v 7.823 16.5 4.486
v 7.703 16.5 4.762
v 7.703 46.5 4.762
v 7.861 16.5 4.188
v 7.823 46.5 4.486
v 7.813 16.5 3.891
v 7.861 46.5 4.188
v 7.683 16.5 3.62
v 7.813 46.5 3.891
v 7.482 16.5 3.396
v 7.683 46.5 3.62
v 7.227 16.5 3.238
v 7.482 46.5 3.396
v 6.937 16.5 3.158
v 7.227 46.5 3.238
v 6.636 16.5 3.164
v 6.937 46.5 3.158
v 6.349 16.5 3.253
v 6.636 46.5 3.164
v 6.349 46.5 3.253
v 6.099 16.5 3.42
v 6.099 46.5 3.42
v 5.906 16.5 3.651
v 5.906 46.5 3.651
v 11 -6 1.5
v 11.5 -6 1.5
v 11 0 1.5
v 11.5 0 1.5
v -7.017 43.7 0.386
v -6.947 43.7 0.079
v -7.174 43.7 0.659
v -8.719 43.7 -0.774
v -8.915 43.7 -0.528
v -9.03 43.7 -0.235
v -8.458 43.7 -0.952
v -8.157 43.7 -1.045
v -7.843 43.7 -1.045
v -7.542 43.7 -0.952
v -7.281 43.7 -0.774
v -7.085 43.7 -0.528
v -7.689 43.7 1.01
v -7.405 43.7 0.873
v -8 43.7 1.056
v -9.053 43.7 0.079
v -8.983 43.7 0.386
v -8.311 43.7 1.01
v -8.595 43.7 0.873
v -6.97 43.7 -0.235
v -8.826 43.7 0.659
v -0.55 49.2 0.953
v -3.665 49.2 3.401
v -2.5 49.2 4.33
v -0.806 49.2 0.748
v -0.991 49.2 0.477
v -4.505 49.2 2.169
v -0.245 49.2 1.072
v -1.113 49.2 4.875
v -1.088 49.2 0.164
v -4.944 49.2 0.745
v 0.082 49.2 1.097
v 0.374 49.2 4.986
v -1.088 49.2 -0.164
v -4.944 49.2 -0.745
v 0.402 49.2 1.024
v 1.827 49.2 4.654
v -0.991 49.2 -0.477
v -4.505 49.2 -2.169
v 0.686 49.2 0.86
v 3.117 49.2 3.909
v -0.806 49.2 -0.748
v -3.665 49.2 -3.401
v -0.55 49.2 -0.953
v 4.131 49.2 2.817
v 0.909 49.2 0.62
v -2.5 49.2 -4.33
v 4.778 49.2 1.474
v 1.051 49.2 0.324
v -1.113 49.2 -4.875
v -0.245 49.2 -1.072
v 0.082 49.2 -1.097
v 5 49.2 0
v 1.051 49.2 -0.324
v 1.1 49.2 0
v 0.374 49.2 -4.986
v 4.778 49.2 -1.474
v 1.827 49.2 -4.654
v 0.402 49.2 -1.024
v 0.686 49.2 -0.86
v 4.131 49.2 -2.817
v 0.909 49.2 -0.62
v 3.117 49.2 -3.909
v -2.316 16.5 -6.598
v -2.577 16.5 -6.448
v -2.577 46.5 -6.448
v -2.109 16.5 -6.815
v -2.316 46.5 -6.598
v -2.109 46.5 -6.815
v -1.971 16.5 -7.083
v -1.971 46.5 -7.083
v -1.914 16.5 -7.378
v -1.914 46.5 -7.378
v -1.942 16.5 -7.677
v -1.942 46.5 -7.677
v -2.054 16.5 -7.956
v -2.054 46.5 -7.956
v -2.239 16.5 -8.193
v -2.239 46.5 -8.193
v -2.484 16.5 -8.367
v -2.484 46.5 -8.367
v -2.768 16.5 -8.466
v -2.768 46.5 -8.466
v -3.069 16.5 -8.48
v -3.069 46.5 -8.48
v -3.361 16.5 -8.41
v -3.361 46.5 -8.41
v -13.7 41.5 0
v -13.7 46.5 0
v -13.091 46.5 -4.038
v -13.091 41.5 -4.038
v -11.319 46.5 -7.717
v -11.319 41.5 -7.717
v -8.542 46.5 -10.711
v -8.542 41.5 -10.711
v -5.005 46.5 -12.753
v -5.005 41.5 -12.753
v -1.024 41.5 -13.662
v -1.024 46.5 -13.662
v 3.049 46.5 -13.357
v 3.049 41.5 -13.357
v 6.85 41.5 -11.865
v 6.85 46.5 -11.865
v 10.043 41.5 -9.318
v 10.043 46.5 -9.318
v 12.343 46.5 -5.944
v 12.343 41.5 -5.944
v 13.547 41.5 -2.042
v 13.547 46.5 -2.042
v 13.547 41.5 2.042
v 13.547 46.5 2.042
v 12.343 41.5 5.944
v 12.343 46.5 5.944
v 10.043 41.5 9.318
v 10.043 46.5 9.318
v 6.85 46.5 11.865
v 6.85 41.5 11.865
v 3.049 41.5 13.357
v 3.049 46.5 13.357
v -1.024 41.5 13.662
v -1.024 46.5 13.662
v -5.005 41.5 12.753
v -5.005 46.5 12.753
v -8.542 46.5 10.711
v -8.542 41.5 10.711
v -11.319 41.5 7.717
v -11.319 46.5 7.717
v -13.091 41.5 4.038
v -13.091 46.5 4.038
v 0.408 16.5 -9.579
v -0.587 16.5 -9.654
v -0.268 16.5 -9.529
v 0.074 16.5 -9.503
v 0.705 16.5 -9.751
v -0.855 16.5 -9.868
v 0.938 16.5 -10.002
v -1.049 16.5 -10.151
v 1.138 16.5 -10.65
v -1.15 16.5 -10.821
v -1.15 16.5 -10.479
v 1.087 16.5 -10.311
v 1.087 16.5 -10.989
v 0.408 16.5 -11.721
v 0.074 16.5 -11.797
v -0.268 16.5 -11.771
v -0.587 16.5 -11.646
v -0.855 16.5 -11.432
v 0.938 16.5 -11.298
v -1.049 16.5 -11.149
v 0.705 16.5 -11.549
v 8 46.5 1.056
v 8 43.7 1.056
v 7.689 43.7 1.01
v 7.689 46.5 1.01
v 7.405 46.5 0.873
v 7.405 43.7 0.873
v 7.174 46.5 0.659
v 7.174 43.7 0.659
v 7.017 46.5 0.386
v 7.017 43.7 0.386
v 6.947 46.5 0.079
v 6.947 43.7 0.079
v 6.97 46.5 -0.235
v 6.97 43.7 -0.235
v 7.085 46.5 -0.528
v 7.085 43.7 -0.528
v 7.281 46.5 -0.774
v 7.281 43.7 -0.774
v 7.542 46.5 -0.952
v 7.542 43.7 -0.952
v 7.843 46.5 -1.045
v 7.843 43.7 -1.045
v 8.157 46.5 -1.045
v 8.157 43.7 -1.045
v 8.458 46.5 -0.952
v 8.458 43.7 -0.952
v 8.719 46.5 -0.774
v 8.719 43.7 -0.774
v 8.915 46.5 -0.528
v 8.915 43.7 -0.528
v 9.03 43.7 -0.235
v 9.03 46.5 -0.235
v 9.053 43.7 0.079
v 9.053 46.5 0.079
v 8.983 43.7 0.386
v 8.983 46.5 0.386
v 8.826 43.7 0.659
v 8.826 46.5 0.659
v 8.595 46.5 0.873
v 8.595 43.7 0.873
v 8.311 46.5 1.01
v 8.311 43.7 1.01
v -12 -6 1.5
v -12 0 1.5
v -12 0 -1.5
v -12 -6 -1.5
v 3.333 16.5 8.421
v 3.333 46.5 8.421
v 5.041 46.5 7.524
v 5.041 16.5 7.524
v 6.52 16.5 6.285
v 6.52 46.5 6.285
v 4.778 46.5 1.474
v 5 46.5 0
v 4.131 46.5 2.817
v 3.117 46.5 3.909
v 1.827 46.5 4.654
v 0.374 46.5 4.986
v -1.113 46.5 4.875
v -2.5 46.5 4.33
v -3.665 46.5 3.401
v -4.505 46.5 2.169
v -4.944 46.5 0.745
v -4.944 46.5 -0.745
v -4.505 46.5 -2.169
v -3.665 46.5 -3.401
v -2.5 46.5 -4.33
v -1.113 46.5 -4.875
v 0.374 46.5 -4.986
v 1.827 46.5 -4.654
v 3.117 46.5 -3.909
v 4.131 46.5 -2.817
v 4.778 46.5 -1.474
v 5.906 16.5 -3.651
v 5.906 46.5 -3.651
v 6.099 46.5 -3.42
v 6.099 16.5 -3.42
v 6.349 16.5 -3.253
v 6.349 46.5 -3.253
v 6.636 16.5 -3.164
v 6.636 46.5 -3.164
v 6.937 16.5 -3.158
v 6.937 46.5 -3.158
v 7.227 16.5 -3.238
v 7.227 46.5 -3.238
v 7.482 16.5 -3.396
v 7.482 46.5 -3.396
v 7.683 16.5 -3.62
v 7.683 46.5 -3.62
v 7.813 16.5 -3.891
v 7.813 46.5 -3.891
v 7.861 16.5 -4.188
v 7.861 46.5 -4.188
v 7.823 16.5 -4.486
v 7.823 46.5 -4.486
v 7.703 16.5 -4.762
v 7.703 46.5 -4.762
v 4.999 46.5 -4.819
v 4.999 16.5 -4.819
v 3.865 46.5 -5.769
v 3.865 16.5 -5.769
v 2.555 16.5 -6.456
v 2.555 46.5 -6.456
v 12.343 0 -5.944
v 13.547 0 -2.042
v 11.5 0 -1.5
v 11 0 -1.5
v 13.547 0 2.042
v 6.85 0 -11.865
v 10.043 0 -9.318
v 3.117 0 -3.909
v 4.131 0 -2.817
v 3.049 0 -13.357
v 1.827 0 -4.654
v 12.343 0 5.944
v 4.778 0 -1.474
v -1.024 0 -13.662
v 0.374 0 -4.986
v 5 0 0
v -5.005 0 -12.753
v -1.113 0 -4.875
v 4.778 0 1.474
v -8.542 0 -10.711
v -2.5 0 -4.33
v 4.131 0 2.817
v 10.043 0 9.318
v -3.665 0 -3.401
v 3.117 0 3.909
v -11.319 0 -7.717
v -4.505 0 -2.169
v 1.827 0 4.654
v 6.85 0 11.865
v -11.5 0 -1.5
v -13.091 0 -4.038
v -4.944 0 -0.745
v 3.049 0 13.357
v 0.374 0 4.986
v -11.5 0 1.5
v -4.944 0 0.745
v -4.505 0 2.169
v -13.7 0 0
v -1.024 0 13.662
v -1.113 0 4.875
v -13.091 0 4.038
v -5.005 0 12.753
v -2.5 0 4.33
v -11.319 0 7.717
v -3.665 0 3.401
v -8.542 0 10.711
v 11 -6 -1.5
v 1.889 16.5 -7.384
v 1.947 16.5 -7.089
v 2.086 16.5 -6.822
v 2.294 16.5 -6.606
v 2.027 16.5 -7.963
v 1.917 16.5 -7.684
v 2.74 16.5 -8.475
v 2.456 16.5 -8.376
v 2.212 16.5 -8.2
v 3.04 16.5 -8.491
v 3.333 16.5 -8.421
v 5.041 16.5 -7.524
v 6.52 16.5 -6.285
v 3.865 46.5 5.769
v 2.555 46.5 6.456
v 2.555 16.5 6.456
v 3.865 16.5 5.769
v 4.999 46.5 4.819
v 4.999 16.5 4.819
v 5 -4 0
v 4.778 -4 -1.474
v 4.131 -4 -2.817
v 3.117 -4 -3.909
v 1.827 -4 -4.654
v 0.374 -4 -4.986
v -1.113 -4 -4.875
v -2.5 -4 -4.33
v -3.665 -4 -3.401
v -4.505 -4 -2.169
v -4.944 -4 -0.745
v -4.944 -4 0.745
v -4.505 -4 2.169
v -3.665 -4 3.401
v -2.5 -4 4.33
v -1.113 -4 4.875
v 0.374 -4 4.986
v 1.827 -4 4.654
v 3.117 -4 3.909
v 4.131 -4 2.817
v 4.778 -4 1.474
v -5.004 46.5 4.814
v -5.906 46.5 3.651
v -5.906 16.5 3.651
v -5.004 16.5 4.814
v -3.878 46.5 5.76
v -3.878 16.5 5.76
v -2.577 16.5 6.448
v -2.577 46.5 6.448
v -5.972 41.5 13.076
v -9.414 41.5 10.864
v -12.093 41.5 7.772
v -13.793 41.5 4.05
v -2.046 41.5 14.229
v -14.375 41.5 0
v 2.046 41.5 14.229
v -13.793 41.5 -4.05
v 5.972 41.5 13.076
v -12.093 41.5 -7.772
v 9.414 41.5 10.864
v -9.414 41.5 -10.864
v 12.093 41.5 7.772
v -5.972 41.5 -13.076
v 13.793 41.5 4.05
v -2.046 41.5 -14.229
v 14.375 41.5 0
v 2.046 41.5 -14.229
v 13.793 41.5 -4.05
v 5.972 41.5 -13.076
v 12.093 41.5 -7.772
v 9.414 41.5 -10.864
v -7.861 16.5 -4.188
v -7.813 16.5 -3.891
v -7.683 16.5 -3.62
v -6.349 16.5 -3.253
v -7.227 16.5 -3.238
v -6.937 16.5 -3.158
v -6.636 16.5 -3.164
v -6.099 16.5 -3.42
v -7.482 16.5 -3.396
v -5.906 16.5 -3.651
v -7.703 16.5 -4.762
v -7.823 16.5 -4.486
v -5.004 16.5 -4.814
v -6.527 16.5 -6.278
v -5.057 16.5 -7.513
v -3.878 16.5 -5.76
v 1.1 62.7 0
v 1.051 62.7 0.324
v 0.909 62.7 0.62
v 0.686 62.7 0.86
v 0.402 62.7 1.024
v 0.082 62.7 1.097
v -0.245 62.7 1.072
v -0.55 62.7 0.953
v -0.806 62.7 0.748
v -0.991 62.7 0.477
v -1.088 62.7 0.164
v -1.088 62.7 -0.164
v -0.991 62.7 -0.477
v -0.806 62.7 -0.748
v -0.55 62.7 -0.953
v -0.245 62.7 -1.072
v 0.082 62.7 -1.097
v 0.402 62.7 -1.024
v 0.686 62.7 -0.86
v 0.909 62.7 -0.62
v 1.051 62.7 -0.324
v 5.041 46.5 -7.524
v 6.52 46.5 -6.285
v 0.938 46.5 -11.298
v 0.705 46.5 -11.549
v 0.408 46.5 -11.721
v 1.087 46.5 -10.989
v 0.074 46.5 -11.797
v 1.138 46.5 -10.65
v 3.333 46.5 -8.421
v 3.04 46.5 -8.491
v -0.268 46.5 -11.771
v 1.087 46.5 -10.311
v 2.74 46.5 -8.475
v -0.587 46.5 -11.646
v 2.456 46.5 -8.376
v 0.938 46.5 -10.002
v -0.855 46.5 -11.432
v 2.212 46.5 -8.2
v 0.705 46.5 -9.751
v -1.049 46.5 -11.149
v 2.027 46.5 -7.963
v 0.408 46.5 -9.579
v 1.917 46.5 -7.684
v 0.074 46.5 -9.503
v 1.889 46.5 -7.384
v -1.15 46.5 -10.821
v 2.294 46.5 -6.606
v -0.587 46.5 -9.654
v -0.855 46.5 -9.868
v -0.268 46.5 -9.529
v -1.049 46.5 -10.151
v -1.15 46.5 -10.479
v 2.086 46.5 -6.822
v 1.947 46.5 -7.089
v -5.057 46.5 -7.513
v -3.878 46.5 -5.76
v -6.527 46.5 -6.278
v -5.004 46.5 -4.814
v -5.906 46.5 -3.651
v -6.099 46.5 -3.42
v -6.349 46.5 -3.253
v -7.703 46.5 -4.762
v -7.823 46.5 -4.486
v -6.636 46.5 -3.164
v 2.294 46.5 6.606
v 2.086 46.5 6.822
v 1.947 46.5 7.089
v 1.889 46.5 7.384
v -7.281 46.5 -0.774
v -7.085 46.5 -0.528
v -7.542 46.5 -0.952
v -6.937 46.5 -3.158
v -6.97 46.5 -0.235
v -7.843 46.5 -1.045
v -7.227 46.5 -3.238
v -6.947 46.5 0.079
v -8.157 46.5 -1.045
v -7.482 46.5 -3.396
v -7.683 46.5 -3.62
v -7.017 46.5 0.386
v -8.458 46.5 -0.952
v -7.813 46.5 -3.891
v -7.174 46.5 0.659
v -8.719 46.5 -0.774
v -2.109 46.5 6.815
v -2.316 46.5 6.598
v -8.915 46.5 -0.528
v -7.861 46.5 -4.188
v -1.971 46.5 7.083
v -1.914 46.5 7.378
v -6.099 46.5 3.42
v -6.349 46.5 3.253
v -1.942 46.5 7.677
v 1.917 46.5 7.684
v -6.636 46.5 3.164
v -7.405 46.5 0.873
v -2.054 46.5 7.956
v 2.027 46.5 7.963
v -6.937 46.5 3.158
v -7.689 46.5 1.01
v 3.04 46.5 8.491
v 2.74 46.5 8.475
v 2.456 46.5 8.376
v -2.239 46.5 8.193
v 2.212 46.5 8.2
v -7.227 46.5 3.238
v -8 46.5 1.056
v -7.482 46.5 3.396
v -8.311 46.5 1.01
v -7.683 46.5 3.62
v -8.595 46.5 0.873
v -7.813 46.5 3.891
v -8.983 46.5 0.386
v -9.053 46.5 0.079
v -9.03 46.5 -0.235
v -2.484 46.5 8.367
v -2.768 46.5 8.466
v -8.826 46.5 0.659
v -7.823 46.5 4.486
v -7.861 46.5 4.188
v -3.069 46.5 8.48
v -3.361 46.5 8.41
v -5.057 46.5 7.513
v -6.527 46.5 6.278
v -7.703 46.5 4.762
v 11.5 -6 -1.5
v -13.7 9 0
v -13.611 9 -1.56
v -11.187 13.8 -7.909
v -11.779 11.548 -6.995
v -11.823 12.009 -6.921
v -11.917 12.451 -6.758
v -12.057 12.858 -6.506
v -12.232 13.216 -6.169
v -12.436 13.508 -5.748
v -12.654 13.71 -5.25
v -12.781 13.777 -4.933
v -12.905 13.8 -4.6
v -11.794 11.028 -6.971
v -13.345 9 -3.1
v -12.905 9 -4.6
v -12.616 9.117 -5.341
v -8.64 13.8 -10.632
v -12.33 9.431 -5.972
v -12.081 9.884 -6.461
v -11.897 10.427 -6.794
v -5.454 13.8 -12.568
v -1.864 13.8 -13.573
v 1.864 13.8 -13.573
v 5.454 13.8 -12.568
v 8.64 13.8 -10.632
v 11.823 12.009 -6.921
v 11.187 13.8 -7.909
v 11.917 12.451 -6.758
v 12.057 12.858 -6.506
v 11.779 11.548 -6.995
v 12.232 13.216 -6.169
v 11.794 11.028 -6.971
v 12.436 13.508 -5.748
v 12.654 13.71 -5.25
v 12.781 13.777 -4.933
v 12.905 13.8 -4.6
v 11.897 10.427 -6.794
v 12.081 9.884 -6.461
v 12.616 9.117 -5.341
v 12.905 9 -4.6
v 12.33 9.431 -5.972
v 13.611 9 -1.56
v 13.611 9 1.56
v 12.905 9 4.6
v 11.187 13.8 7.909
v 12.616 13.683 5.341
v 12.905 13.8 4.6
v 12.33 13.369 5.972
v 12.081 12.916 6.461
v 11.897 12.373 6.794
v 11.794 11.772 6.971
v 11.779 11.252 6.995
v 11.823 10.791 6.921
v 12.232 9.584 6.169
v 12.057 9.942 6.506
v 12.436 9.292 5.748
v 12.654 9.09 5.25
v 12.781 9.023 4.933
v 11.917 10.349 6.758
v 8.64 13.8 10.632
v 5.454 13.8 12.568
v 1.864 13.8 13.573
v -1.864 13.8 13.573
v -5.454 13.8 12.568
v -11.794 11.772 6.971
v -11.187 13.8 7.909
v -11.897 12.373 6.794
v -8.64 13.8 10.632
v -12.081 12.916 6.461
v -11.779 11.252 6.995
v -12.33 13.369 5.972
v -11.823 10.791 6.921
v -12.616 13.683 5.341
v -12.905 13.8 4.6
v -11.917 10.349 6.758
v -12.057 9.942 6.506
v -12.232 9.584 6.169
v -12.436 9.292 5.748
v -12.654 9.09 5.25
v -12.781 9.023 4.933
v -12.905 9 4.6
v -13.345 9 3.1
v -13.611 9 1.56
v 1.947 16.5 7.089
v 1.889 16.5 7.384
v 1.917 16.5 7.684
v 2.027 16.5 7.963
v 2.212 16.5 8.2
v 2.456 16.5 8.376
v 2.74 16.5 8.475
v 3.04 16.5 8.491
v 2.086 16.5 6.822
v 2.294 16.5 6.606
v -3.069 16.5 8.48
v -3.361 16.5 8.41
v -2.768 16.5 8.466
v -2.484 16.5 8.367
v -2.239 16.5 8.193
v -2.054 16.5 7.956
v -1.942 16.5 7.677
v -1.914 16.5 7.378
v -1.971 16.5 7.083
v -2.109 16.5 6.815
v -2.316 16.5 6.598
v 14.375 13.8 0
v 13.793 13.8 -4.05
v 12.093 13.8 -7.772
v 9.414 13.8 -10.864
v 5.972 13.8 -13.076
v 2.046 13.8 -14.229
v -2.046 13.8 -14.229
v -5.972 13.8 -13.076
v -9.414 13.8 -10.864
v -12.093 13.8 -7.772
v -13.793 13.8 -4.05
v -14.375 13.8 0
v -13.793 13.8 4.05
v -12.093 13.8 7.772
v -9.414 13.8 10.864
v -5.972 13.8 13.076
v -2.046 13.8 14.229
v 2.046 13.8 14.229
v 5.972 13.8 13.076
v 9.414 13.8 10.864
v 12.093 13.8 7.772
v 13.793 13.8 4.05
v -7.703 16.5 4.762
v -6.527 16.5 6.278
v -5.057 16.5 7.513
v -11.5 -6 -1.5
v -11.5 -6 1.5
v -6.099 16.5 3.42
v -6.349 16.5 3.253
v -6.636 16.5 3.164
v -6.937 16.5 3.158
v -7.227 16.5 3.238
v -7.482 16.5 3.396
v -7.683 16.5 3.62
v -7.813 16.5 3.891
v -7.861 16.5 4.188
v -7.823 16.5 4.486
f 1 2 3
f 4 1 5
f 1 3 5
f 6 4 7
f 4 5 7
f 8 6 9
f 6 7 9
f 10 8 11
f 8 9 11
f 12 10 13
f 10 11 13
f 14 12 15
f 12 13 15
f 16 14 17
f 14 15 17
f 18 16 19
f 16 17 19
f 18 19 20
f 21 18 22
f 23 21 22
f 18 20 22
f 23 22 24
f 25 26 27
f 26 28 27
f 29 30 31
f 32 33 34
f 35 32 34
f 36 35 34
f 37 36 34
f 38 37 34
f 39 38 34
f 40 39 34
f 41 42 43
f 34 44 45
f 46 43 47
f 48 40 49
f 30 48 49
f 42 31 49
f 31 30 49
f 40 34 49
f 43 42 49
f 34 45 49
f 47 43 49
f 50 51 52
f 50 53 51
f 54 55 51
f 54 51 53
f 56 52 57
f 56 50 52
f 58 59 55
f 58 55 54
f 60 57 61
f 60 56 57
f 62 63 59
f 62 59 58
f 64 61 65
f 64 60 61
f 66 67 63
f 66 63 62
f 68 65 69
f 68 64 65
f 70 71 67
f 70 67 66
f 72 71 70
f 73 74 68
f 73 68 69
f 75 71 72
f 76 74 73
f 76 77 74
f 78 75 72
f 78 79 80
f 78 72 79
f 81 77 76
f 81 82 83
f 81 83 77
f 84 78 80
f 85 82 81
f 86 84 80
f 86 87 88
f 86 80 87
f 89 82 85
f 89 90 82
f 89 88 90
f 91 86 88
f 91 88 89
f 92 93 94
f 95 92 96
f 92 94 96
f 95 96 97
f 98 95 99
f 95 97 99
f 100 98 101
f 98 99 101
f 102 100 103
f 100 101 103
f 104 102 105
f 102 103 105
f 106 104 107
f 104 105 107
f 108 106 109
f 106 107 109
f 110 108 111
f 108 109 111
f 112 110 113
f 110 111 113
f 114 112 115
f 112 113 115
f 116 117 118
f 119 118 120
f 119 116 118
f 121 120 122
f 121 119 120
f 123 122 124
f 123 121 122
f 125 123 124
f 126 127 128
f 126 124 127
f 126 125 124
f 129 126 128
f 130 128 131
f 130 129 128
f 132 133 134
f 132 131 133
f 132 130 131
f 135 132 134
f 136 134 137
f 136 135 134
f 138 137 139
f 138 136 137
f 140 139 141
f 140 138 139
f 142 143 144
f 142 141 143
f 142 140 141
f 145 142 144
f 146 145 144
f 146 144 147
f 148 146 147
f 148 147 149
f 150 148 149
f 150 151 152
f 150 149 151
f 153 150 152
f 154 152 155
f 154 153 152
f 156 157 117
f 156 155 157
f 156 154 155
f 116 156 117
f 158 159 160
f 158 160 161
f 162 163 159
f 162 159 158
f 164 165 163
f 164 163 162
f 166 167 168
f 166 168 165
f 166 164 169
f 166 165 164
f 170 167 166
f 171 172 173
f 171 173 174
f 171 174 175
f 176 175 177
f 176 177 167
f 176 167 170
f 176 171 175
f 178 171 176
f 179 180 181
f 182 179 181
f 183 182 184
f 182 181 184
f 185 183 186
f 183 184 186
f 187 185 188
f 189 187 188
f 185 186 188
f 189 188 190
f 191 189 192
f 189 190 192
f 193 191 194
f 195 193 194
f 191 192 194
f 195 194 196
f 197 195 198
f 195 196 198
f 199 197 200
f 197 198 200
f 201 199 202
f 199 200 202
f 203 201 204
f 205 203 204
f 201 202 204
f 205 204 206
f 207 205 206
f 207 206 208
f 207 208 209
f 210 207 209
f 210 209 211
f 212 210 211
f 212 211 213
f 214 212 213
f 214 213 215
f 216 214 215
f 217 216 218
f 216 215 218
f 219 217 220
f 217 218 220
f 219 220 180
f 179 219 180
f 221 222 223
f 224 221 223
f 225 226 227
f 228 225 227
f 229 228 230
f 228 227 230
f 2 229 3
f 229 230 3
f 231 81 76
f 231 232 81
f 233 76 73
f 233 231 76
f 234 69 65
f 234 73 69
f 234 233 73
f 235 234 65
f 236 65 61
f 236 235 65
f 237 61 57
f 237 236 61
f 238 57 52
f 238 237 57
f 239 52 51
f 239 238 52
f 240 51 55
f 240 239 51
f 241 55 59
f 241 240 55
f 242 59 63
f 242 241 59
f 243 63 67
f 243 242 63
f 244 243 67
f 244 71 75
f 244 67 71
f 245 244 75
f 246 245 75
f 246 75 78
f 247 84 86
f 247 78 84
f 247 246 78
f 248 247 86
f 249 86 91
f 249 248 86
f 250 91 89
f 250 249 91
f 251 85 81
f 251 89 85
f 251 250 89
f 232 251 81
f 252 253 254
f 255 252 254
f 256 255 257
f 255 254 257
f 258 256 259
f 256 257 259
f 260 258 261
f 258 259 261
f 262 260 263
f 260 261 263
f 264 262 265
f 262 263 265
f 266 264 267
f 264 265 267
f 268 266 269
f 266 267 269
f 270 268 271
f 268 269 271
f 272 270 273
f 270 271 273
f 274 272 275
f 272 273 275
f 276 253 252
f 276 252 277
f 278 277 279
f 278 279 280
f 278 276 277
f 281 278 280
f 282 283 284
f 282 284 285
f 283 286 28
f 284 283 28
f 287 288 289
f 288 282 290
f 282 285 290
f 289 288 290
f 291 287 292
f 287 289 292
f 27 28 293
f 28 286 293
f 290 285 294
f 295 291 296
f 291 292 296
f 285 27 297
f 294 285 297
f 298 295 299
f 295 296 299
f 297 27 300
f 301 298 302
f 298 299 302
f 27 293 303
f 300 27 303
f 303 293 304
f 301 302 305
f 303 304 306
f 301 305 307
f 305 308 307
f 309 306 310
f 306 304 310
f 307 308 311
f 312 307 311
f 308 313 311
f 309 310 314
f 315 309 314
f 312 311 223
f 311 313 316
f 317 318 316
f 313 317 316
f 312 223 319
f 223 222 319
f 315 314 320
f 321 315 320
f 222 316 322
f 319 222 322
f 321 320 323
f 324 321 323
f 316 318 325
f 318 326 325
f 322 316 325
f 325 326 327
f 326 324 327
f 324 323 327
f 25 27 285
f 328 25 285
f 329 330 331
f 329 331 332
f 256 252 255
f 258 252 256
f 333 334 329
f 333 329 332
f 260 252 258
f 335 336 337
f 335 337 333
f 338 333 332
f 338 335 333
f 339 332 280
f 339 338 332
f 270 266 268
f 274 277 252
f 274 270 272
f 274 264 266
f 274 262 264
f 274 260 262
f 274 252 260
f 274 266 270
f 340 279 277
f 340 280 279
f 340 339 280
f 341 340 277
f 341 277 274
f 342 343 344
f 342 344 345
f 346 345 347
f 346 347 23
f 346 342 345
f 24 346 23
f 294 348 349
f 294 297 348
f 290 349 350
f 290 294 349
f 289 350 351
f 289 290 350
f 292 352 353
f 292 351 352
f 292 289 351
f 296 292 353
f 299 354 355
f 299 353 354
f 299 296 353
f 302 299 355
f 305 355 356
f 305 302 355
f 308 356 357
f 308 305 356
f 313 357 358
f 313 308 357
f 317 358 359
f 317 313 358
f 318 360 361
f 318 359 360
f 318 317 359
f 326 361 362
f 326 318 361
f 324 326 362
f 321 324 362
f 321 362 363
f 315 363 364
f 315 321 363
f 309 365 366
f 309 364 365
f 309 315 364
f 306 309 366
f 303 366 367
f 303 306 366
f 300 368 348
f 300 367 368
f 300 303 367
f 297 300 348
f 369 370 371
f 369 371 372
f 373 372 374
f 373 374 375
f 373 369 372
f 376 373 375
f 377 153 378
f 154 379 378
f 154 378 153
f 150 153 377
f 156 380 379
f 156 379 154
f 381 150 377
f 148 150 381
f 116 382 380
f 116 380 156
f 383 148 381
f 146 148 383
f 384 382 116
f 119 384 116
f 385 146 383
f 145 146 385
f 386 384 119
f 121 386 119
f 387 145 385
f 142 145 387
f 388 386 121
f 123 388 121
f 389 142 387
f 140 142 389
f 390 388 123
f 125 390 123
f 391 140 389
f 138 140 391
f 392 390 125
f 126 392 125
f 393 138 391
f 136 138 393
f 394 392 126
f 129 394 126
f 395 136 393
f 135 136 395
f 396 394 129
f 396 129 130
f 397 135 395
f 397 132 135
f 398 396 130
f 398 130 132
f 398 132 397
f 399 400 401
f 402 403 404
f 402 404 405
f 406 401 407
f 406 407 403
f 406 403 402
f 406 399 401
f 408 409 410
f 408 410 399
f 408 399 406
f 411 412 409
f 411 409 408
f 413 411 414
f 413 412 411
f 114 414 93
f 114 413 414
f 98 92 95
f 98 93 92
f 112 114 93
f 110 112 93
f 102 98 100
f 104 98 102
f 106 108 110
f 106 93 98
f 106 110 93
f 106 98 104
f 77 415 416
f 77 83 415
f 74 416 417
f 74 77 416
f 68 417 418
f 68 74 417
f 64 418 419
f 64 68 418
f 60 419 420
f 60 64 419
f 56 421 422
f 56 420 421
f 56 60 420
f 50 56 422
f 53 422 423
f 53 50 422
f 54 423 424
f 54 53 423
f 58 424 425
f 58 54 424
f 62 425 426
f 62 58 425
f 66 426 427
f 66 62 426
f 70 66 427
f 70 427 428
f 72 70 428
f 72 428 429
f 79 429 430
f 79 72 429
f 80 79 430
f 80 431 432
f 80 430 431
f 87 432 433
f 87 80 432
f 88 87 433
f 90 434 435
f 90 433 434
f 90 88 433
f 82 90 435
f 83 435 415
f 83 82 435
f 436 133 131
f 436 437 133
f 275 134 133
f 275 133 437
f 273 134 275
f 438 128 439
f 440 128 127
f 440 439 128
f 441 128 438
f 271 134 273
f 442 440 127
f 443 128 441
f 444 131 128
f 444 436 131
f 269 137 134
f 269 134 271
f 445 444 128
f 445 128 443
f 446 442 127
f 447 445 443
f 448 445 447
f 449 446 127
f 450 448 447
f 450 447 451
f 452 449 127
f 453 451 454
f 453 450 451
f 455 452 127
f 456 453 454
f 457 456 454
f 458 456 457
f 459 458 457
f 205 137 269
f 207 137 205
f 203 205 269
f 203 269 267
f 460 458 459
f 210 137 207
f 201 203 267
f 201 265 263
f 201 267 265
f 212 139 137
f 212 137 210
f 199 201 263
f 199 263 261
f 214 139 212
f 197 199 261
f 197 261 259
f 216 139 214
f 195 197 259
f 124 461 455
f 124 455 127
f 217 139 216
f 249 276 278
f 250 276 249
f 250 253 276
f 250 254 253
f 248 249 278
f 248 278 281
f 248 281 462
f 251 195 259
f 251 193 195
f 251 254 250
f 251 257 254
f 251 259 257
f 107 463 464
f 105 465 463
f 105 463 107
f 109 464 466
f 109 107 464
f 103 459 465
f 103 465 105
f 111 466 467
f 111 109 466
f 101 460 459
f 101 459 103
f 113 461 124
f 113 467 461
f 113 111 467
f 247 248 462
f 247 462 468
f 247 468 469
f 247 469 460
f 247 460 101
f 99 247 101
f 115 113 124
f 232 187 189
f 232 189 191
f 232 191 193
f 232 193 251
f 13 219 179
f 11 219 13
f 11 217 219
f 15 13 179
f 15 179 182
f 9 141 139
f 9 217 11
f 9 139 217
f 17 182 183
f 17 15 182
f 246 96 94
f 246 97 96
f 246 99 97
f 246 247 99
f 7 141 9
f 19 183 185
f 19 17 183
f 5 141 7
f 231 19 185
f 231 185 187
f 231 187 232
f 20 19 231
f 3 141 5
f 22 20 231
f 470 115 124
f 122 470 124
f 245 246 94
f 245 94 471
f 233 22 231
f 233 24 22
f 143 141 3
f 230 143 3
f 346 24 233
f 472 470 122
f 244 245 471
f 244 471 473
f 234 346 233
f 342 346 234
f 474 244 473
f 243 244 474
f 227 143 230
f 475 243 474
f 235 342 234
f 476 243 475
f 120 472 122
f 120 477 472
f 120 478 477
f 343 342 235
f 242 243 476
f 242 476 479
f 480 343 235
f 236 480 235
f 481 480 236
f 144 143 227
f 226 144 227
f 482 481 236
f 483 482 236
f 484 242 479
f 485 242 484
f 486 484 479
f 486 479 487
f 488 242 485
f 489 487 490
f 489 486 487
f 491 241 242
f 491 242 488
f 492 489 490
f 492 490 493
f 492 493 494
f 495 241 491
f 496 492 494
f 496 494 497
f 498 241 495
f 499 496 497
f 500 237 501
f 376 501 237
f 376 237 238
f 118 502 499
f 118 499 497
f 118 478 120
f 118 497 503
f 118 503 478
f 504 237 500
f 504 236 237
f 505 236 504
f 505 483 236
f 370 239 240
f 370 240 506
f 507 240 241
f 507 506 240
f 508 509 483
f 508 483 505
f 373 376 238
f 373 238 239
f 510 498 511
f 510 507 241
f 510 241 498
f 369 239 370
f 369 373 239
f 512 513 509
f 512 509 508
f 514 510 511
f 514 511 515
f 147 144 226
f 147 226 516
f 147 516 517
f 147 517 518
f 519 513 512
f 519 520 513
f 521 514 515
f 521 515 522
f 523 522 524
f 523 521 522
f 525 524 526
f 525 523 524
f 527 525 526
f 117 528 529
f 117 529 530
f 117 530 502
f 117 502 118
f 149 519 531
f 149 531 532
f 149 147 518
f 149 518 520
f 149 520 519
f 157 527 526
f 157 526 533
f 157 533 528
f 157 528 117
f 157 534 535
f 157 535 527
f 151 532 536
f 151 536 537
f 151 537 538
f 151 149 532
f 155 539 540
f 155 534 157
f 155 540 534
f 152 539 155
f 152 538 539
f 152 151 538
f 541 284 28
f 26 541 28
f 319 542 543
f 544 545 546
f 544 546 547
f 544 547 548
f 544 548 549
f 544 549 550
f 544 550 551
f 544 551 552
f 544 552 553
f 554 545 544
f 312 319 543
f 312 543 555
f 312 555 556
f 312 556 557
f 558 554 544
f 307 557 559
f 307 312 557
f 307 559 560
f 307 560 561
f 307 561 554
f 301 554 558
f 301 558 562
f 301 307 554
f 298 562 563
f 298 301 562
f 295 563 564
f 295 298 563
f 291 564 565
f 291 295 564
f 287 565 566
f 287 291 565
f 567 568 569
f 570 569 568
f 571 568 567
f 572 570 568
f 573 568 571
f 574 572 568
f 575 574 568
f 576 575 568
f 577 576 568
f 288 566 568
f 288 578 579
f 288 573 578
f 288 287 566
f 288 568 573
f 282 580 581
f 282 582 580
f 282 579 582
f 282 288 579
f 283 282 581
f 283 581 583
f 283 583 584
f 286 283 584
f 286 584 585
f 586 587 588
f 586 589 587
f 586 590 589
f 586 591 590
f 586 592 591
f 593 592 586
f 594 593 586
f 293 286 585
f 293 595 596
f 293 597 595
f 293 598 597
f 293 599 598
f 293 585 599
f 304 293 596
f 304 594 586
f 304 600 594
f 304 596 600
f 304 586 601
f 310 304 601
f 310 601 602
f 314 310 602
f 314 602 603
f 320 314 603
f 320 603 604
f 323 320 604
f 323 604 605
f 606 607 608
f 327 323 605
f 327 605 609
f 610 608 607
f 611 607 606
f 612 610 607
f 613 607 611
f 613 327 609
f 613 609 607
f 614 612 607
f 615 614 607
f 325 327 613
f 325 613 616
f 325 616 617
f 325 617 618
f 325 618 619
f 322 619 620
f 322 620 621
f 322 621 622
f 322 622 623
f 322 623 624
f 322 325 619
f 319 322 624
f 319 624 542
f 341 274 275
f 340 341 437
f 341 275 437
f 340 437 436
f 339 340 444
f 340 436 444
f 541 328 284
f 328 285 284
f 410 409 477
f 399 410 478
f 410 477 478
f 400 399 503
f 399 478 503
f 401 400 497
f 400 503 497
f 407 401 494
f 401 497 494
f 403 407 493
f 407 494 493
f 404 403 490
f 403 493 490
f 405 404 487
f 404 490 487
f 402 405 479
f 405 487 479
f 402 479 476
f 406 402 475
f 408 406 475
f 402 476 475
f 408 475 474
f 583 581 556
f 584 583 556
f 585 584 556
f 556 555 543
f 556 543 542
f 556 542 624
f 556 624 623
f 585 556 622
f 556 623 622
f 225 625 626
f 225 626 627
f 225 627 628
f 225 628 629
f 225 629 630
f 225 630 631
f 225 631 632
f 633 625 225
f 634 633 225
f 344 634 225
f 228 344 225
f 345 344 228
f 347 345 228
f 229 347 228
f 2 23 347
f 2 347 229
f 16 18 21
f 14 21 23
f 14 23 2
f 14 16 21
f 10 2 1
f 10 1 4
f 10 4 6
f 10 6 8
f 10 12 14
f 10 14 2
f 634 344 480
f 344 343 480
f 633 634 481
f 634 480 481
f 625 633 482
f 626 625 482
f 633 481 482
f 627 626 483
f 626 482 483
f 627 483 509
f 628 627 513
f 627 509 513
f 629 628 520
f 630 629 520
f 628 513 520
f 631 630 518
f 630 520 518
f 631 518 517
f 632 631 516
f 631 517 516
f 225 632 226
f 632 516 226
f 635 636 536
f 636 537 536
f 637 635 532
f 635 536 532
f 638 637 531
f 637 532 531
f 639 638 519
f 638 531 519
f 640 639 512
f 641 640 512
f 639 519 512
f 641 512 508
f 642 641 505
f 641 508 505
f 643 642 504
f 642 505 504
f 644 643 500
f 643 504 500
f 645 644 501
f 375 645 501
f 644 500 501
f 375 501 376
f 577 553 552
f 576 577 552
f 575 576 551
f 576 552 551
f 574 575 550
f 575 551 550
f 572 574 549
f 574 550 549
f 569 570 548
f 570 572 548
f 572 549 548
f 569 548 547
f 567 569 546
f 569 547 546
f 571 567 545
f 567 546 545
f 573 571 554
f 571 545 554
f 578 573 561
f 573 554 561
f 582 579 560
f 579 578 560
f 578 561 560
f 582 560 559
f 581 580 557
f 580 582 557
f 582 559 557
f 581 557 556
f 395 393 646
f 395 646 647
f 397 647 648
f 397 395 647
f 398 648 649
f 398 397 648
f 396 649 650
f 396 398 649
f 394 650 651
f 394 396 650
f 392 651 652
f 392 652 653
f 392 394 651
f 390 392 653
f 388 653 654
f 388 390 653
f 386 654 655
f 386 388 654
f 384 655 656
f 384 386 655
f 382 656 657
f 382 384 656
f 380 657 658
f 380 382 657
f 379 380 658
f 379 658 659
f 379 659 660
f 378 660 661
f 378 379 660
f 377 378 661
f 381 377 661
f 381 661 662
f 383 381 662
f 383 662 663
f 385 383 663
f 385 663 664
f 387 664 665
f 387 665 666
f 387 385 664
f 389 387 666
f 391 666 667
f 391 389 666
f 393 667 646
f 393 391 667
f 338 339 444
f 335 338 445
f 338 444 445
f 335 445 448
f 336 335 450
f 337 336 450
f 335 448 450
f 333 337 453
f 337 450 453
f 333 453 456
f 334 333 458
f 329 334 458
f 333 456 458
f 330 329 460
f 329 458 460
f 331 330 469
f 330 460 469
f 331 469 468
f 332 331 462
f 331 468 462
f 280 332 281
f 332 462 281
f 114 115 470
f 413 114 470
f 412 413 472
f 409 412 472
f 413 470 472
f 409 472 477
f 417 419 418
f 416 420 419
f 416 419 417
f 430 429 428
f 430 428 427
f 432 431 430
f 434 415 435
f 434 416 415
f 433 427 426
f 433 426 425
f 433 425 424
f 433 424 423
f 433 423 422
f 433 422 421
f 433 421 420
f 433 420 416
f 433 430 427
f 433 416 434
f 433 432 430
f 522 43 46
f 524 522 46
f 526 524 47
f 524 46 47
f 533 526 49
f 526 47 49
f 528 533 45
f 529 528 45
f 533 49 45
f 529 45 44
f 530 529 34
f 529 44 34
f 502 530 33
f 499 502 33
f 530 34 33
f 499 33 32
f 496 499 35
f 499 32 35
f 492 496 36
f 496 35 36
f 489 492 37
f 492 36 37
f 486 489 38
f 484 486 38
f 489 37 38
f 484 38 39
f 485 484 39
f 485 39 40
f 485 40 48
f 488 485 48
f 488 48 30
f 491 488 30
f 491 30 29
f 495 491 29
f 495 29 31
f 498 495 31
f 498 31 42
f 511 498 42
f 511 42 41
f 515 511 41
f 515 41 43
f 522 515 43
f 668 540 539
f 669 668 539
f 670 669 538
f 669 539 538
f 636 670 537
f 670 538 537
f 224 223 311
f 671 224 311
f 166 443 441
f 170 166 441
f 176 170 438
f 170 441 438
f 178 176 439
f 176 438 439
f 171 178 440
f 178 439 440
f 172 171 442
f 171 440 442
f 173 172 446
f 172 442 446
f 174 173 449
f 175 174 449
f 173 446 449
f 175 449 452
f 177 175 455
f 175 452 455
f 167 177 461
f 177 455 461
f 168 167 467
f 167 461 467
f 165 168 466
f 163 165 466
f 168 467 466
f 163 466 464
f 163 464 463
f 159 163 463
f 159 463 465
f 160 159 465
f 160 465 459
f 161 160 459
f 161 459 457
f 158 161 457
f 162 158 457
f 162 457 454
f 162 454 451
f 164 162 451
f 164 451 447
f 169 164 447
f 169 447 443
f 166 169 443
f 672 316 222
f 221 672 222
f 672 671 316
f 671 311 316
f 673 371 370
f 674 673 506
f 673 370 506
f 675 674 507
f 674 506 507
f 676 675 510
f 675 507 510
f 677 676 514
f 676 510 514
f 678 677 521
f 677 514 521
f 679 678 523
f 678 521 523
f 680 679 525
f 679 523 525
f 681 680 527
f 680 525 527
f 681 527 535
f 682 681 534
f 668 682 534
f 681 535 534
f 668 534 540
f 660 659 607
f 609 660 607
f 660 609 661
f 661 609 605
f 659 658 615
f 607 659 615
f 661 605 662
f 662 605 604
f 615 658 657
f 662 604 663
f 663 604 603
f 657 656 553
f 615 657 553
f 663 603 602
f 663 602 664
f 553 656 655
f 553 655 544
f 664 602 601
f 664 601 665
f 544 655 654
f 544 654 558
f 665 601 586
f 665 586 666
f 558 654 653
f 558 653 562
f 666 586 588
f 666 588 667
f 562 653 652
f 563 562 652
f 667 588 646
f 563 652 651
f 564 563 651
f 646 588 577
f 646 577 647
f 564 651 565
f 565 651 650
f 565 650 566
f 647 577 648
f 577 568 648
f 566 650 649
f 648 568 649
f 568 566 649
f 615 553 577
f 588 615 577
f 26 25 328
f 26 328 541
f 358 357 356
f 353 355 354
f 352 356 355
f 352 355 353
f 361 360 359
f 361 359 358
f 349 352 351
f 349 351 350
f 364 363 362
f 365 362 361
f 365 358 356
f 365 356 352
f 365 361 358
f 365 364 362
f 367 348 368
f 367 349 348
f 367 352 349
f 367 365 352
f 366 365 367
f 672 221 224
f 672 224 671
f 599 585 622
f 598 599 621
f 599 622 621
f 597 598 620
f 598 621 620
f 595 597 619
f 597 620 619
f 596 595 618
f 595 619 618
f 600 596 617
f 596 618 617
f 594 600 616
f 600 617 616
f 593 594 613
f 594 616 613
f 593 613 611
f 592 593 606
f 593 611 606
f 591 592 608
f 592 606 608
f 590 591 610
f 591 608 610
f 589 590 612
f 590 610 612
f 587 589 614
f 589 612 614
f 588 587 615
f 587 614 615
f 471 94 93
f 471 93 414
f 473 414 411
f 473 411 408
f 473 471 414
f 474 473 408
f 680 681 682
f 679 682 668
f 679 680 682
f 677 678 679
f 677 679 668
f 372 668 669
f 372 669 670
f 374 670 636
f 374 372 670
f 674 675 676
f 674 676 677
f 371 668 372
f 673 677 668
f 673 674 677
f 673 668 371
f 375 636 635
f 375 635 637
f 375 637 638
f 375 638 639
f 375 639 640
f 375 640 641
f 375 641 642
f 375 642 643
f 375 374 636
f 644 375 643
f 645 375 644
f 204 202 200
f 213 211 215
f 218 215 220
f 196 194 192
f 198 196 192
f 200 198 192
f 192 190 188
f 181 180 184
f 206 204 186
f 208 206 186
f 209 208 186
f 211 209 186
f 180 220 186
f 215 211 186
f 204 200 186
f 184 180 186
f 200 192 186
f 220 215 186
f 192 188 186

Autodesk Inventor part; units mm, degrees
ref_plane "YZ Plane" through (0, 0, 0) normal (1, 0, 0) x (0, 1, 0)
sketch "Sketch1" plane through (0, 0, 0) normal (0, 1, 0) x (-1, 0, 0)
  circle A0 centre (0, 0) radius 13.7
  dimension "d0" = 27.4
extrude "Extrusion1" add sketch "Sketch1" along normal blind 46.5
sketch "Sketch2" plane through (0, 46.5, 0) normal (0, 1, 0) x (1, 0, 0)
  circle A0 centre (0, 0) radius 13.7 projected
  circle A1 centre (0, 0) radius 5
  dimension "d3" = 10
extrude "Extrusion2" add sketch "Sketch2" along normal blind 2.7 contours A1
sketch "Sketch3" plane through (0, 46.5, 0) normal (0, 1, 0) x (1, 0, 0)
  circle A0 centre (0, 0) radius 5 projected
  circle A1 centre (0, 0) radius 5 projected
  circle A2 centre (0, 0) radius 13.7 projected
  circle A3 centre (0, 0) radius 13.7 projected
  line L0 (-13.7, 0) -> (13.7, 0)
  point P0 (-8, 0)
  point P1 (8, 0)
  dimension "d6" = 16
  dimension "d7" = 5.7
  dimension "d8" = 5.7
hole "Hole1" at (-8, 46.5, 0) at (8, 46.5, 0) direction (0, -1, 0) diameter 2.1129 depth 2.8 thread size "M2.6x0.45" class "6H" standard "ISO Metric profile"
ref_plane "Work Plane1" through (0, 41.5, 0) normal (0, 1, 0) x (1, 0, 0)
sketch "Sketch4" plane through (0, 41.5, 0) normal (0, 1, 0) x (1, 0, 0)
  circle A0 centre (0, 0) radius 14.375
  dimension "d17" = 28.75
extrude "Extrusion3" add sketch "Sketch4" against normal blind 27.7
sketch "Sketch5" plane through (0, 0, 0) normal (0, -1, 0) x (1, 0, 0)
  circle A0 centre (0, 0) radius 5
  dimension "d20" = 10
extrude "Extrusion4" add sketch "Sketch5" along normal blind 4
sketch "Sketch6" plane through (0, 0, 0) normal (0, -1, 0) x (1, 0, 0)
  circle A0 centre (0, 0) radius 5 projected
  circle A1 centre (0, 0) radius 5 projected
  circle A2 centre (0, 0) radius 13.7 projected
  circle A3 centre (0, 0) radius 13.7 projected
  line L0 (13.7, 0) -> (-13.7, 0)
  line L1 (-11.5, 1.5) -> (-12, 1.5)
  line L2 (-12, 1.5) -> (-12, -1.5)
  line L3 (-12, -1.5) -> (-11.5, -1.5)
  line L4 (-11.5, -1.5) -> (-11.5, 1.5)
  line L5 (11.5, 1.5) -> (11, 1.5)
  line L6 (11, 1.5) -> (11, -1.5)
  line L7 (11, -1.5) -> (11.5, -1.5)
  line L8 (11.5, -1.5) -> (11.5, 1.5)
  dimension "d23" = 22.5
  dimension "d24" = 0.5
  dimension "d25" = 0.5
  dimension "d26" = 11.5
  dimension "d27" = 11.5
  dimension "d28" = 3
  dimension "d29" = 3
  dimension "d30" = 1.5
  dimension "d31" = 1.5
extrude "Extrusion5" add sketch "Sketch6" along normal blind 6 contours L6 L5 L8 L0 | L0 L8 L7 L6 | L4 L3 L2 L0 | L0 L2 L1 L4
sketch "Sketch7" plane through (0, 49.2, 0) normal (0, 1, 0) x (1, 0, 0)
  circle A0 centre (0, 0) radius 1.1
  dimension "d34" = 2.2
extrude "Extrusion6" add sketch "Sketch7" along normal blind 13.5
ref_plane "Work Plane2" through (0, 50.2, 0) normal (0, 1, 0) x (1, 0, 0)
sketch "Sketch10" plane through (0, 0, 0) normal (1, 0, 0) x (0, 1, 0)
  line L0 (0, -13.7) -> (0, 13.7) projected
  line L1 (13.8, 13.7) -> (13.8, -13.7) projected
  line L2 (9, 4.6) -> (13.8, 4.6)
  line L3 (13.8, 4.6) -> (13.8, -4.6)
  line L4 (13.8, -4.6) -> (9, -4.6)
  line L5 (9, -4.6) -> (9, 4.6)
  circle A0 centre (11.4, 4.6) radius 2.4
  circle A1 centre (11.4, -4.6) radius 2.4
  line L6 (0, 0) -> (13.8, 0)
  line L7 (13.8, 13.7) -> (13.8, -13.7) projected
  line L8 (0, -13.7) -> (13.8, -13.7) projected
  point P0 (11.4, 7)
  point P1 (11.4, -7)
  point P2 (13.8, -4.6)
  dimension "d57" = 9
  dimension "d59" = 0
  dimension "d60" = 4.8
  dimension "d61" = 13.8
  dimension "d62" = 2.4
  dimension "d63" = 2.4
  dimension "d64" = 14
  dimension "d65" = 4.6
  dimension "d66" = 4.6
  dimension "d69" = 6.7
extrude "Extrusion9" cut sketch "Sketch10" along normal mid plane 31.5 contours L6 L1 A1 L5 | L5 A0 L1 L6 | A1 L4 | L4 A1 | A0 L2 | L2 A0
sketch "Sketch11" plane through (0, 46.5, 0) normal (0, 1, 0) x (1, 0, 0)
  circle A0 centre (-8, 0) radius 1.0564 projected
  circle A1 centre (8, 0) radius 1.0564 projected
  circle A2 centre (0, 0) radius 5 projected
  circle A3 centre (0, 0) radius 13.7 projected
  circle A4 centre (8, 0) radius 1.0564 projected
  circle A5 centre (0, 0) radius 13.7 projected
  line L0 (13.7, 0) -> (-13.7, 0)
  circle A6 centre (0, 0) radius 1.1 projected
  circle A7 centre (0, 0) radius 9.0564
  circle A8 centre (0, 0) radius 6.9436
  circle A9 centre (8, 0) radius 1.0564 projected
  line L1 (1.8876, -9.0564) -> (-1.9124, -9.0564)
  line L2 (-1.9124, -9.0564) -> (-1.9124, 9.0564)
  line L3 (-1.9124, 9.0564) -> (1.8876, 9.0564)
  line L4 (1.8876, 9.0564) -> (1.8876, -9.0564)
  line L5 (-0.0124, -13.7) -> (-0.0124, 13.7)
  line L6 (9.0564, -3.15) -> (-9.0564, -3.15)
  line L7 (-9.0564, -3.15) -> (-9.0564, 3.15)
  line L8 (-9.0564, 3.15) -> (9.0564, 3.15)
  line L9 (9.0564, 3.15) -> (9.0564, -3.15)
  circle A10 centre (6.8048, -4.2064) radius 1.0564
  circle A11 centre (2.9441, -7.4386) radius 1.0564
  circle A12 centre (-2.9688, -7.4287) radius 1.0564
  circle A13 centre (-6.8048, -4.2064) radius 1.0564
  circle A14 centre (-6.8048, 4.2064) radius 1.0564
  line L10 (-11.7767, 7) -> (11.7767, 7) projected
  circle A15 centre (-2.9688, 7.4287) radius 1.0564
  circle A16 centre (2.9441, 7.4386) radius 1.0564
  circle A17 centre (6.8048, 4.2064) radius 1.0564
  circle A18 centre (-0.0124, 10.65) radius 1.15
  point P0 (9.0564, 0)
  point P1 (7.8048, -3.2064)
  point P2 (3.3328, 8.4209)
  point P3 (2.5553, 6.4563)
  point P4 (5.9062, 3.651)
  point P5 (7.7035, 4.7619)
  point P6 (-5.9062, 3.651)
  point P7 (-2.5768, 6.4477)
  point P8 (-3.3608, 8.4097)
  point P9 (-7.7035, 4.7619)
  point P10 (-3.3608, -8.4097)
  point P11 (-2.5768, -6.4477)
  point P12 (-5.9062, -3.651)
  point P13 (-7.7035, -4.7619)
  point P14 (7.7035, -4.7619)
  point P15 (5.9062, -3.651)
  point P16 (2.5553, -6.4563)
  point P17 (3.3328, -8.4209)
  point P18 (-0.0124, 11.8)
  dimension "d78" = 2.3
  dimension "d70" = 3.8
  dimension "d71" = 1.9
  dimension "d72" = 1.9
  dimension "d73" = 6.3
  dimension "d74" = 3.15
  dimension "d75" = 3.15
  dimension "d79" = 1.9
extrude "Extrusion10" cut sketch "Sketch11" against normal blind 30 contours A14 A7 L10 A15 A8 | A14 | A8 A12 A7 A13 | A13 | A15 L10 | A12 | A7 A15 L10 | A15 L10 | A18 L5 | L5 A18 | L10 A16 A7 | A7 A17 A8 A16 L10 | A11 A8 A10 A7 | A11 | A17 | A16 L10 | A16 L10 | A10
equation "\"d7\" = d8"
equation "\"d26\" = d27"
equation "\"d30\" = d31"
equation "\"d65\" = d66"
equation "\"d71\" = d72"
equation "\"d74\" = d75"
equation "\"d41\" = d42"
properties part number "rs390" material "Steel, Mild"
